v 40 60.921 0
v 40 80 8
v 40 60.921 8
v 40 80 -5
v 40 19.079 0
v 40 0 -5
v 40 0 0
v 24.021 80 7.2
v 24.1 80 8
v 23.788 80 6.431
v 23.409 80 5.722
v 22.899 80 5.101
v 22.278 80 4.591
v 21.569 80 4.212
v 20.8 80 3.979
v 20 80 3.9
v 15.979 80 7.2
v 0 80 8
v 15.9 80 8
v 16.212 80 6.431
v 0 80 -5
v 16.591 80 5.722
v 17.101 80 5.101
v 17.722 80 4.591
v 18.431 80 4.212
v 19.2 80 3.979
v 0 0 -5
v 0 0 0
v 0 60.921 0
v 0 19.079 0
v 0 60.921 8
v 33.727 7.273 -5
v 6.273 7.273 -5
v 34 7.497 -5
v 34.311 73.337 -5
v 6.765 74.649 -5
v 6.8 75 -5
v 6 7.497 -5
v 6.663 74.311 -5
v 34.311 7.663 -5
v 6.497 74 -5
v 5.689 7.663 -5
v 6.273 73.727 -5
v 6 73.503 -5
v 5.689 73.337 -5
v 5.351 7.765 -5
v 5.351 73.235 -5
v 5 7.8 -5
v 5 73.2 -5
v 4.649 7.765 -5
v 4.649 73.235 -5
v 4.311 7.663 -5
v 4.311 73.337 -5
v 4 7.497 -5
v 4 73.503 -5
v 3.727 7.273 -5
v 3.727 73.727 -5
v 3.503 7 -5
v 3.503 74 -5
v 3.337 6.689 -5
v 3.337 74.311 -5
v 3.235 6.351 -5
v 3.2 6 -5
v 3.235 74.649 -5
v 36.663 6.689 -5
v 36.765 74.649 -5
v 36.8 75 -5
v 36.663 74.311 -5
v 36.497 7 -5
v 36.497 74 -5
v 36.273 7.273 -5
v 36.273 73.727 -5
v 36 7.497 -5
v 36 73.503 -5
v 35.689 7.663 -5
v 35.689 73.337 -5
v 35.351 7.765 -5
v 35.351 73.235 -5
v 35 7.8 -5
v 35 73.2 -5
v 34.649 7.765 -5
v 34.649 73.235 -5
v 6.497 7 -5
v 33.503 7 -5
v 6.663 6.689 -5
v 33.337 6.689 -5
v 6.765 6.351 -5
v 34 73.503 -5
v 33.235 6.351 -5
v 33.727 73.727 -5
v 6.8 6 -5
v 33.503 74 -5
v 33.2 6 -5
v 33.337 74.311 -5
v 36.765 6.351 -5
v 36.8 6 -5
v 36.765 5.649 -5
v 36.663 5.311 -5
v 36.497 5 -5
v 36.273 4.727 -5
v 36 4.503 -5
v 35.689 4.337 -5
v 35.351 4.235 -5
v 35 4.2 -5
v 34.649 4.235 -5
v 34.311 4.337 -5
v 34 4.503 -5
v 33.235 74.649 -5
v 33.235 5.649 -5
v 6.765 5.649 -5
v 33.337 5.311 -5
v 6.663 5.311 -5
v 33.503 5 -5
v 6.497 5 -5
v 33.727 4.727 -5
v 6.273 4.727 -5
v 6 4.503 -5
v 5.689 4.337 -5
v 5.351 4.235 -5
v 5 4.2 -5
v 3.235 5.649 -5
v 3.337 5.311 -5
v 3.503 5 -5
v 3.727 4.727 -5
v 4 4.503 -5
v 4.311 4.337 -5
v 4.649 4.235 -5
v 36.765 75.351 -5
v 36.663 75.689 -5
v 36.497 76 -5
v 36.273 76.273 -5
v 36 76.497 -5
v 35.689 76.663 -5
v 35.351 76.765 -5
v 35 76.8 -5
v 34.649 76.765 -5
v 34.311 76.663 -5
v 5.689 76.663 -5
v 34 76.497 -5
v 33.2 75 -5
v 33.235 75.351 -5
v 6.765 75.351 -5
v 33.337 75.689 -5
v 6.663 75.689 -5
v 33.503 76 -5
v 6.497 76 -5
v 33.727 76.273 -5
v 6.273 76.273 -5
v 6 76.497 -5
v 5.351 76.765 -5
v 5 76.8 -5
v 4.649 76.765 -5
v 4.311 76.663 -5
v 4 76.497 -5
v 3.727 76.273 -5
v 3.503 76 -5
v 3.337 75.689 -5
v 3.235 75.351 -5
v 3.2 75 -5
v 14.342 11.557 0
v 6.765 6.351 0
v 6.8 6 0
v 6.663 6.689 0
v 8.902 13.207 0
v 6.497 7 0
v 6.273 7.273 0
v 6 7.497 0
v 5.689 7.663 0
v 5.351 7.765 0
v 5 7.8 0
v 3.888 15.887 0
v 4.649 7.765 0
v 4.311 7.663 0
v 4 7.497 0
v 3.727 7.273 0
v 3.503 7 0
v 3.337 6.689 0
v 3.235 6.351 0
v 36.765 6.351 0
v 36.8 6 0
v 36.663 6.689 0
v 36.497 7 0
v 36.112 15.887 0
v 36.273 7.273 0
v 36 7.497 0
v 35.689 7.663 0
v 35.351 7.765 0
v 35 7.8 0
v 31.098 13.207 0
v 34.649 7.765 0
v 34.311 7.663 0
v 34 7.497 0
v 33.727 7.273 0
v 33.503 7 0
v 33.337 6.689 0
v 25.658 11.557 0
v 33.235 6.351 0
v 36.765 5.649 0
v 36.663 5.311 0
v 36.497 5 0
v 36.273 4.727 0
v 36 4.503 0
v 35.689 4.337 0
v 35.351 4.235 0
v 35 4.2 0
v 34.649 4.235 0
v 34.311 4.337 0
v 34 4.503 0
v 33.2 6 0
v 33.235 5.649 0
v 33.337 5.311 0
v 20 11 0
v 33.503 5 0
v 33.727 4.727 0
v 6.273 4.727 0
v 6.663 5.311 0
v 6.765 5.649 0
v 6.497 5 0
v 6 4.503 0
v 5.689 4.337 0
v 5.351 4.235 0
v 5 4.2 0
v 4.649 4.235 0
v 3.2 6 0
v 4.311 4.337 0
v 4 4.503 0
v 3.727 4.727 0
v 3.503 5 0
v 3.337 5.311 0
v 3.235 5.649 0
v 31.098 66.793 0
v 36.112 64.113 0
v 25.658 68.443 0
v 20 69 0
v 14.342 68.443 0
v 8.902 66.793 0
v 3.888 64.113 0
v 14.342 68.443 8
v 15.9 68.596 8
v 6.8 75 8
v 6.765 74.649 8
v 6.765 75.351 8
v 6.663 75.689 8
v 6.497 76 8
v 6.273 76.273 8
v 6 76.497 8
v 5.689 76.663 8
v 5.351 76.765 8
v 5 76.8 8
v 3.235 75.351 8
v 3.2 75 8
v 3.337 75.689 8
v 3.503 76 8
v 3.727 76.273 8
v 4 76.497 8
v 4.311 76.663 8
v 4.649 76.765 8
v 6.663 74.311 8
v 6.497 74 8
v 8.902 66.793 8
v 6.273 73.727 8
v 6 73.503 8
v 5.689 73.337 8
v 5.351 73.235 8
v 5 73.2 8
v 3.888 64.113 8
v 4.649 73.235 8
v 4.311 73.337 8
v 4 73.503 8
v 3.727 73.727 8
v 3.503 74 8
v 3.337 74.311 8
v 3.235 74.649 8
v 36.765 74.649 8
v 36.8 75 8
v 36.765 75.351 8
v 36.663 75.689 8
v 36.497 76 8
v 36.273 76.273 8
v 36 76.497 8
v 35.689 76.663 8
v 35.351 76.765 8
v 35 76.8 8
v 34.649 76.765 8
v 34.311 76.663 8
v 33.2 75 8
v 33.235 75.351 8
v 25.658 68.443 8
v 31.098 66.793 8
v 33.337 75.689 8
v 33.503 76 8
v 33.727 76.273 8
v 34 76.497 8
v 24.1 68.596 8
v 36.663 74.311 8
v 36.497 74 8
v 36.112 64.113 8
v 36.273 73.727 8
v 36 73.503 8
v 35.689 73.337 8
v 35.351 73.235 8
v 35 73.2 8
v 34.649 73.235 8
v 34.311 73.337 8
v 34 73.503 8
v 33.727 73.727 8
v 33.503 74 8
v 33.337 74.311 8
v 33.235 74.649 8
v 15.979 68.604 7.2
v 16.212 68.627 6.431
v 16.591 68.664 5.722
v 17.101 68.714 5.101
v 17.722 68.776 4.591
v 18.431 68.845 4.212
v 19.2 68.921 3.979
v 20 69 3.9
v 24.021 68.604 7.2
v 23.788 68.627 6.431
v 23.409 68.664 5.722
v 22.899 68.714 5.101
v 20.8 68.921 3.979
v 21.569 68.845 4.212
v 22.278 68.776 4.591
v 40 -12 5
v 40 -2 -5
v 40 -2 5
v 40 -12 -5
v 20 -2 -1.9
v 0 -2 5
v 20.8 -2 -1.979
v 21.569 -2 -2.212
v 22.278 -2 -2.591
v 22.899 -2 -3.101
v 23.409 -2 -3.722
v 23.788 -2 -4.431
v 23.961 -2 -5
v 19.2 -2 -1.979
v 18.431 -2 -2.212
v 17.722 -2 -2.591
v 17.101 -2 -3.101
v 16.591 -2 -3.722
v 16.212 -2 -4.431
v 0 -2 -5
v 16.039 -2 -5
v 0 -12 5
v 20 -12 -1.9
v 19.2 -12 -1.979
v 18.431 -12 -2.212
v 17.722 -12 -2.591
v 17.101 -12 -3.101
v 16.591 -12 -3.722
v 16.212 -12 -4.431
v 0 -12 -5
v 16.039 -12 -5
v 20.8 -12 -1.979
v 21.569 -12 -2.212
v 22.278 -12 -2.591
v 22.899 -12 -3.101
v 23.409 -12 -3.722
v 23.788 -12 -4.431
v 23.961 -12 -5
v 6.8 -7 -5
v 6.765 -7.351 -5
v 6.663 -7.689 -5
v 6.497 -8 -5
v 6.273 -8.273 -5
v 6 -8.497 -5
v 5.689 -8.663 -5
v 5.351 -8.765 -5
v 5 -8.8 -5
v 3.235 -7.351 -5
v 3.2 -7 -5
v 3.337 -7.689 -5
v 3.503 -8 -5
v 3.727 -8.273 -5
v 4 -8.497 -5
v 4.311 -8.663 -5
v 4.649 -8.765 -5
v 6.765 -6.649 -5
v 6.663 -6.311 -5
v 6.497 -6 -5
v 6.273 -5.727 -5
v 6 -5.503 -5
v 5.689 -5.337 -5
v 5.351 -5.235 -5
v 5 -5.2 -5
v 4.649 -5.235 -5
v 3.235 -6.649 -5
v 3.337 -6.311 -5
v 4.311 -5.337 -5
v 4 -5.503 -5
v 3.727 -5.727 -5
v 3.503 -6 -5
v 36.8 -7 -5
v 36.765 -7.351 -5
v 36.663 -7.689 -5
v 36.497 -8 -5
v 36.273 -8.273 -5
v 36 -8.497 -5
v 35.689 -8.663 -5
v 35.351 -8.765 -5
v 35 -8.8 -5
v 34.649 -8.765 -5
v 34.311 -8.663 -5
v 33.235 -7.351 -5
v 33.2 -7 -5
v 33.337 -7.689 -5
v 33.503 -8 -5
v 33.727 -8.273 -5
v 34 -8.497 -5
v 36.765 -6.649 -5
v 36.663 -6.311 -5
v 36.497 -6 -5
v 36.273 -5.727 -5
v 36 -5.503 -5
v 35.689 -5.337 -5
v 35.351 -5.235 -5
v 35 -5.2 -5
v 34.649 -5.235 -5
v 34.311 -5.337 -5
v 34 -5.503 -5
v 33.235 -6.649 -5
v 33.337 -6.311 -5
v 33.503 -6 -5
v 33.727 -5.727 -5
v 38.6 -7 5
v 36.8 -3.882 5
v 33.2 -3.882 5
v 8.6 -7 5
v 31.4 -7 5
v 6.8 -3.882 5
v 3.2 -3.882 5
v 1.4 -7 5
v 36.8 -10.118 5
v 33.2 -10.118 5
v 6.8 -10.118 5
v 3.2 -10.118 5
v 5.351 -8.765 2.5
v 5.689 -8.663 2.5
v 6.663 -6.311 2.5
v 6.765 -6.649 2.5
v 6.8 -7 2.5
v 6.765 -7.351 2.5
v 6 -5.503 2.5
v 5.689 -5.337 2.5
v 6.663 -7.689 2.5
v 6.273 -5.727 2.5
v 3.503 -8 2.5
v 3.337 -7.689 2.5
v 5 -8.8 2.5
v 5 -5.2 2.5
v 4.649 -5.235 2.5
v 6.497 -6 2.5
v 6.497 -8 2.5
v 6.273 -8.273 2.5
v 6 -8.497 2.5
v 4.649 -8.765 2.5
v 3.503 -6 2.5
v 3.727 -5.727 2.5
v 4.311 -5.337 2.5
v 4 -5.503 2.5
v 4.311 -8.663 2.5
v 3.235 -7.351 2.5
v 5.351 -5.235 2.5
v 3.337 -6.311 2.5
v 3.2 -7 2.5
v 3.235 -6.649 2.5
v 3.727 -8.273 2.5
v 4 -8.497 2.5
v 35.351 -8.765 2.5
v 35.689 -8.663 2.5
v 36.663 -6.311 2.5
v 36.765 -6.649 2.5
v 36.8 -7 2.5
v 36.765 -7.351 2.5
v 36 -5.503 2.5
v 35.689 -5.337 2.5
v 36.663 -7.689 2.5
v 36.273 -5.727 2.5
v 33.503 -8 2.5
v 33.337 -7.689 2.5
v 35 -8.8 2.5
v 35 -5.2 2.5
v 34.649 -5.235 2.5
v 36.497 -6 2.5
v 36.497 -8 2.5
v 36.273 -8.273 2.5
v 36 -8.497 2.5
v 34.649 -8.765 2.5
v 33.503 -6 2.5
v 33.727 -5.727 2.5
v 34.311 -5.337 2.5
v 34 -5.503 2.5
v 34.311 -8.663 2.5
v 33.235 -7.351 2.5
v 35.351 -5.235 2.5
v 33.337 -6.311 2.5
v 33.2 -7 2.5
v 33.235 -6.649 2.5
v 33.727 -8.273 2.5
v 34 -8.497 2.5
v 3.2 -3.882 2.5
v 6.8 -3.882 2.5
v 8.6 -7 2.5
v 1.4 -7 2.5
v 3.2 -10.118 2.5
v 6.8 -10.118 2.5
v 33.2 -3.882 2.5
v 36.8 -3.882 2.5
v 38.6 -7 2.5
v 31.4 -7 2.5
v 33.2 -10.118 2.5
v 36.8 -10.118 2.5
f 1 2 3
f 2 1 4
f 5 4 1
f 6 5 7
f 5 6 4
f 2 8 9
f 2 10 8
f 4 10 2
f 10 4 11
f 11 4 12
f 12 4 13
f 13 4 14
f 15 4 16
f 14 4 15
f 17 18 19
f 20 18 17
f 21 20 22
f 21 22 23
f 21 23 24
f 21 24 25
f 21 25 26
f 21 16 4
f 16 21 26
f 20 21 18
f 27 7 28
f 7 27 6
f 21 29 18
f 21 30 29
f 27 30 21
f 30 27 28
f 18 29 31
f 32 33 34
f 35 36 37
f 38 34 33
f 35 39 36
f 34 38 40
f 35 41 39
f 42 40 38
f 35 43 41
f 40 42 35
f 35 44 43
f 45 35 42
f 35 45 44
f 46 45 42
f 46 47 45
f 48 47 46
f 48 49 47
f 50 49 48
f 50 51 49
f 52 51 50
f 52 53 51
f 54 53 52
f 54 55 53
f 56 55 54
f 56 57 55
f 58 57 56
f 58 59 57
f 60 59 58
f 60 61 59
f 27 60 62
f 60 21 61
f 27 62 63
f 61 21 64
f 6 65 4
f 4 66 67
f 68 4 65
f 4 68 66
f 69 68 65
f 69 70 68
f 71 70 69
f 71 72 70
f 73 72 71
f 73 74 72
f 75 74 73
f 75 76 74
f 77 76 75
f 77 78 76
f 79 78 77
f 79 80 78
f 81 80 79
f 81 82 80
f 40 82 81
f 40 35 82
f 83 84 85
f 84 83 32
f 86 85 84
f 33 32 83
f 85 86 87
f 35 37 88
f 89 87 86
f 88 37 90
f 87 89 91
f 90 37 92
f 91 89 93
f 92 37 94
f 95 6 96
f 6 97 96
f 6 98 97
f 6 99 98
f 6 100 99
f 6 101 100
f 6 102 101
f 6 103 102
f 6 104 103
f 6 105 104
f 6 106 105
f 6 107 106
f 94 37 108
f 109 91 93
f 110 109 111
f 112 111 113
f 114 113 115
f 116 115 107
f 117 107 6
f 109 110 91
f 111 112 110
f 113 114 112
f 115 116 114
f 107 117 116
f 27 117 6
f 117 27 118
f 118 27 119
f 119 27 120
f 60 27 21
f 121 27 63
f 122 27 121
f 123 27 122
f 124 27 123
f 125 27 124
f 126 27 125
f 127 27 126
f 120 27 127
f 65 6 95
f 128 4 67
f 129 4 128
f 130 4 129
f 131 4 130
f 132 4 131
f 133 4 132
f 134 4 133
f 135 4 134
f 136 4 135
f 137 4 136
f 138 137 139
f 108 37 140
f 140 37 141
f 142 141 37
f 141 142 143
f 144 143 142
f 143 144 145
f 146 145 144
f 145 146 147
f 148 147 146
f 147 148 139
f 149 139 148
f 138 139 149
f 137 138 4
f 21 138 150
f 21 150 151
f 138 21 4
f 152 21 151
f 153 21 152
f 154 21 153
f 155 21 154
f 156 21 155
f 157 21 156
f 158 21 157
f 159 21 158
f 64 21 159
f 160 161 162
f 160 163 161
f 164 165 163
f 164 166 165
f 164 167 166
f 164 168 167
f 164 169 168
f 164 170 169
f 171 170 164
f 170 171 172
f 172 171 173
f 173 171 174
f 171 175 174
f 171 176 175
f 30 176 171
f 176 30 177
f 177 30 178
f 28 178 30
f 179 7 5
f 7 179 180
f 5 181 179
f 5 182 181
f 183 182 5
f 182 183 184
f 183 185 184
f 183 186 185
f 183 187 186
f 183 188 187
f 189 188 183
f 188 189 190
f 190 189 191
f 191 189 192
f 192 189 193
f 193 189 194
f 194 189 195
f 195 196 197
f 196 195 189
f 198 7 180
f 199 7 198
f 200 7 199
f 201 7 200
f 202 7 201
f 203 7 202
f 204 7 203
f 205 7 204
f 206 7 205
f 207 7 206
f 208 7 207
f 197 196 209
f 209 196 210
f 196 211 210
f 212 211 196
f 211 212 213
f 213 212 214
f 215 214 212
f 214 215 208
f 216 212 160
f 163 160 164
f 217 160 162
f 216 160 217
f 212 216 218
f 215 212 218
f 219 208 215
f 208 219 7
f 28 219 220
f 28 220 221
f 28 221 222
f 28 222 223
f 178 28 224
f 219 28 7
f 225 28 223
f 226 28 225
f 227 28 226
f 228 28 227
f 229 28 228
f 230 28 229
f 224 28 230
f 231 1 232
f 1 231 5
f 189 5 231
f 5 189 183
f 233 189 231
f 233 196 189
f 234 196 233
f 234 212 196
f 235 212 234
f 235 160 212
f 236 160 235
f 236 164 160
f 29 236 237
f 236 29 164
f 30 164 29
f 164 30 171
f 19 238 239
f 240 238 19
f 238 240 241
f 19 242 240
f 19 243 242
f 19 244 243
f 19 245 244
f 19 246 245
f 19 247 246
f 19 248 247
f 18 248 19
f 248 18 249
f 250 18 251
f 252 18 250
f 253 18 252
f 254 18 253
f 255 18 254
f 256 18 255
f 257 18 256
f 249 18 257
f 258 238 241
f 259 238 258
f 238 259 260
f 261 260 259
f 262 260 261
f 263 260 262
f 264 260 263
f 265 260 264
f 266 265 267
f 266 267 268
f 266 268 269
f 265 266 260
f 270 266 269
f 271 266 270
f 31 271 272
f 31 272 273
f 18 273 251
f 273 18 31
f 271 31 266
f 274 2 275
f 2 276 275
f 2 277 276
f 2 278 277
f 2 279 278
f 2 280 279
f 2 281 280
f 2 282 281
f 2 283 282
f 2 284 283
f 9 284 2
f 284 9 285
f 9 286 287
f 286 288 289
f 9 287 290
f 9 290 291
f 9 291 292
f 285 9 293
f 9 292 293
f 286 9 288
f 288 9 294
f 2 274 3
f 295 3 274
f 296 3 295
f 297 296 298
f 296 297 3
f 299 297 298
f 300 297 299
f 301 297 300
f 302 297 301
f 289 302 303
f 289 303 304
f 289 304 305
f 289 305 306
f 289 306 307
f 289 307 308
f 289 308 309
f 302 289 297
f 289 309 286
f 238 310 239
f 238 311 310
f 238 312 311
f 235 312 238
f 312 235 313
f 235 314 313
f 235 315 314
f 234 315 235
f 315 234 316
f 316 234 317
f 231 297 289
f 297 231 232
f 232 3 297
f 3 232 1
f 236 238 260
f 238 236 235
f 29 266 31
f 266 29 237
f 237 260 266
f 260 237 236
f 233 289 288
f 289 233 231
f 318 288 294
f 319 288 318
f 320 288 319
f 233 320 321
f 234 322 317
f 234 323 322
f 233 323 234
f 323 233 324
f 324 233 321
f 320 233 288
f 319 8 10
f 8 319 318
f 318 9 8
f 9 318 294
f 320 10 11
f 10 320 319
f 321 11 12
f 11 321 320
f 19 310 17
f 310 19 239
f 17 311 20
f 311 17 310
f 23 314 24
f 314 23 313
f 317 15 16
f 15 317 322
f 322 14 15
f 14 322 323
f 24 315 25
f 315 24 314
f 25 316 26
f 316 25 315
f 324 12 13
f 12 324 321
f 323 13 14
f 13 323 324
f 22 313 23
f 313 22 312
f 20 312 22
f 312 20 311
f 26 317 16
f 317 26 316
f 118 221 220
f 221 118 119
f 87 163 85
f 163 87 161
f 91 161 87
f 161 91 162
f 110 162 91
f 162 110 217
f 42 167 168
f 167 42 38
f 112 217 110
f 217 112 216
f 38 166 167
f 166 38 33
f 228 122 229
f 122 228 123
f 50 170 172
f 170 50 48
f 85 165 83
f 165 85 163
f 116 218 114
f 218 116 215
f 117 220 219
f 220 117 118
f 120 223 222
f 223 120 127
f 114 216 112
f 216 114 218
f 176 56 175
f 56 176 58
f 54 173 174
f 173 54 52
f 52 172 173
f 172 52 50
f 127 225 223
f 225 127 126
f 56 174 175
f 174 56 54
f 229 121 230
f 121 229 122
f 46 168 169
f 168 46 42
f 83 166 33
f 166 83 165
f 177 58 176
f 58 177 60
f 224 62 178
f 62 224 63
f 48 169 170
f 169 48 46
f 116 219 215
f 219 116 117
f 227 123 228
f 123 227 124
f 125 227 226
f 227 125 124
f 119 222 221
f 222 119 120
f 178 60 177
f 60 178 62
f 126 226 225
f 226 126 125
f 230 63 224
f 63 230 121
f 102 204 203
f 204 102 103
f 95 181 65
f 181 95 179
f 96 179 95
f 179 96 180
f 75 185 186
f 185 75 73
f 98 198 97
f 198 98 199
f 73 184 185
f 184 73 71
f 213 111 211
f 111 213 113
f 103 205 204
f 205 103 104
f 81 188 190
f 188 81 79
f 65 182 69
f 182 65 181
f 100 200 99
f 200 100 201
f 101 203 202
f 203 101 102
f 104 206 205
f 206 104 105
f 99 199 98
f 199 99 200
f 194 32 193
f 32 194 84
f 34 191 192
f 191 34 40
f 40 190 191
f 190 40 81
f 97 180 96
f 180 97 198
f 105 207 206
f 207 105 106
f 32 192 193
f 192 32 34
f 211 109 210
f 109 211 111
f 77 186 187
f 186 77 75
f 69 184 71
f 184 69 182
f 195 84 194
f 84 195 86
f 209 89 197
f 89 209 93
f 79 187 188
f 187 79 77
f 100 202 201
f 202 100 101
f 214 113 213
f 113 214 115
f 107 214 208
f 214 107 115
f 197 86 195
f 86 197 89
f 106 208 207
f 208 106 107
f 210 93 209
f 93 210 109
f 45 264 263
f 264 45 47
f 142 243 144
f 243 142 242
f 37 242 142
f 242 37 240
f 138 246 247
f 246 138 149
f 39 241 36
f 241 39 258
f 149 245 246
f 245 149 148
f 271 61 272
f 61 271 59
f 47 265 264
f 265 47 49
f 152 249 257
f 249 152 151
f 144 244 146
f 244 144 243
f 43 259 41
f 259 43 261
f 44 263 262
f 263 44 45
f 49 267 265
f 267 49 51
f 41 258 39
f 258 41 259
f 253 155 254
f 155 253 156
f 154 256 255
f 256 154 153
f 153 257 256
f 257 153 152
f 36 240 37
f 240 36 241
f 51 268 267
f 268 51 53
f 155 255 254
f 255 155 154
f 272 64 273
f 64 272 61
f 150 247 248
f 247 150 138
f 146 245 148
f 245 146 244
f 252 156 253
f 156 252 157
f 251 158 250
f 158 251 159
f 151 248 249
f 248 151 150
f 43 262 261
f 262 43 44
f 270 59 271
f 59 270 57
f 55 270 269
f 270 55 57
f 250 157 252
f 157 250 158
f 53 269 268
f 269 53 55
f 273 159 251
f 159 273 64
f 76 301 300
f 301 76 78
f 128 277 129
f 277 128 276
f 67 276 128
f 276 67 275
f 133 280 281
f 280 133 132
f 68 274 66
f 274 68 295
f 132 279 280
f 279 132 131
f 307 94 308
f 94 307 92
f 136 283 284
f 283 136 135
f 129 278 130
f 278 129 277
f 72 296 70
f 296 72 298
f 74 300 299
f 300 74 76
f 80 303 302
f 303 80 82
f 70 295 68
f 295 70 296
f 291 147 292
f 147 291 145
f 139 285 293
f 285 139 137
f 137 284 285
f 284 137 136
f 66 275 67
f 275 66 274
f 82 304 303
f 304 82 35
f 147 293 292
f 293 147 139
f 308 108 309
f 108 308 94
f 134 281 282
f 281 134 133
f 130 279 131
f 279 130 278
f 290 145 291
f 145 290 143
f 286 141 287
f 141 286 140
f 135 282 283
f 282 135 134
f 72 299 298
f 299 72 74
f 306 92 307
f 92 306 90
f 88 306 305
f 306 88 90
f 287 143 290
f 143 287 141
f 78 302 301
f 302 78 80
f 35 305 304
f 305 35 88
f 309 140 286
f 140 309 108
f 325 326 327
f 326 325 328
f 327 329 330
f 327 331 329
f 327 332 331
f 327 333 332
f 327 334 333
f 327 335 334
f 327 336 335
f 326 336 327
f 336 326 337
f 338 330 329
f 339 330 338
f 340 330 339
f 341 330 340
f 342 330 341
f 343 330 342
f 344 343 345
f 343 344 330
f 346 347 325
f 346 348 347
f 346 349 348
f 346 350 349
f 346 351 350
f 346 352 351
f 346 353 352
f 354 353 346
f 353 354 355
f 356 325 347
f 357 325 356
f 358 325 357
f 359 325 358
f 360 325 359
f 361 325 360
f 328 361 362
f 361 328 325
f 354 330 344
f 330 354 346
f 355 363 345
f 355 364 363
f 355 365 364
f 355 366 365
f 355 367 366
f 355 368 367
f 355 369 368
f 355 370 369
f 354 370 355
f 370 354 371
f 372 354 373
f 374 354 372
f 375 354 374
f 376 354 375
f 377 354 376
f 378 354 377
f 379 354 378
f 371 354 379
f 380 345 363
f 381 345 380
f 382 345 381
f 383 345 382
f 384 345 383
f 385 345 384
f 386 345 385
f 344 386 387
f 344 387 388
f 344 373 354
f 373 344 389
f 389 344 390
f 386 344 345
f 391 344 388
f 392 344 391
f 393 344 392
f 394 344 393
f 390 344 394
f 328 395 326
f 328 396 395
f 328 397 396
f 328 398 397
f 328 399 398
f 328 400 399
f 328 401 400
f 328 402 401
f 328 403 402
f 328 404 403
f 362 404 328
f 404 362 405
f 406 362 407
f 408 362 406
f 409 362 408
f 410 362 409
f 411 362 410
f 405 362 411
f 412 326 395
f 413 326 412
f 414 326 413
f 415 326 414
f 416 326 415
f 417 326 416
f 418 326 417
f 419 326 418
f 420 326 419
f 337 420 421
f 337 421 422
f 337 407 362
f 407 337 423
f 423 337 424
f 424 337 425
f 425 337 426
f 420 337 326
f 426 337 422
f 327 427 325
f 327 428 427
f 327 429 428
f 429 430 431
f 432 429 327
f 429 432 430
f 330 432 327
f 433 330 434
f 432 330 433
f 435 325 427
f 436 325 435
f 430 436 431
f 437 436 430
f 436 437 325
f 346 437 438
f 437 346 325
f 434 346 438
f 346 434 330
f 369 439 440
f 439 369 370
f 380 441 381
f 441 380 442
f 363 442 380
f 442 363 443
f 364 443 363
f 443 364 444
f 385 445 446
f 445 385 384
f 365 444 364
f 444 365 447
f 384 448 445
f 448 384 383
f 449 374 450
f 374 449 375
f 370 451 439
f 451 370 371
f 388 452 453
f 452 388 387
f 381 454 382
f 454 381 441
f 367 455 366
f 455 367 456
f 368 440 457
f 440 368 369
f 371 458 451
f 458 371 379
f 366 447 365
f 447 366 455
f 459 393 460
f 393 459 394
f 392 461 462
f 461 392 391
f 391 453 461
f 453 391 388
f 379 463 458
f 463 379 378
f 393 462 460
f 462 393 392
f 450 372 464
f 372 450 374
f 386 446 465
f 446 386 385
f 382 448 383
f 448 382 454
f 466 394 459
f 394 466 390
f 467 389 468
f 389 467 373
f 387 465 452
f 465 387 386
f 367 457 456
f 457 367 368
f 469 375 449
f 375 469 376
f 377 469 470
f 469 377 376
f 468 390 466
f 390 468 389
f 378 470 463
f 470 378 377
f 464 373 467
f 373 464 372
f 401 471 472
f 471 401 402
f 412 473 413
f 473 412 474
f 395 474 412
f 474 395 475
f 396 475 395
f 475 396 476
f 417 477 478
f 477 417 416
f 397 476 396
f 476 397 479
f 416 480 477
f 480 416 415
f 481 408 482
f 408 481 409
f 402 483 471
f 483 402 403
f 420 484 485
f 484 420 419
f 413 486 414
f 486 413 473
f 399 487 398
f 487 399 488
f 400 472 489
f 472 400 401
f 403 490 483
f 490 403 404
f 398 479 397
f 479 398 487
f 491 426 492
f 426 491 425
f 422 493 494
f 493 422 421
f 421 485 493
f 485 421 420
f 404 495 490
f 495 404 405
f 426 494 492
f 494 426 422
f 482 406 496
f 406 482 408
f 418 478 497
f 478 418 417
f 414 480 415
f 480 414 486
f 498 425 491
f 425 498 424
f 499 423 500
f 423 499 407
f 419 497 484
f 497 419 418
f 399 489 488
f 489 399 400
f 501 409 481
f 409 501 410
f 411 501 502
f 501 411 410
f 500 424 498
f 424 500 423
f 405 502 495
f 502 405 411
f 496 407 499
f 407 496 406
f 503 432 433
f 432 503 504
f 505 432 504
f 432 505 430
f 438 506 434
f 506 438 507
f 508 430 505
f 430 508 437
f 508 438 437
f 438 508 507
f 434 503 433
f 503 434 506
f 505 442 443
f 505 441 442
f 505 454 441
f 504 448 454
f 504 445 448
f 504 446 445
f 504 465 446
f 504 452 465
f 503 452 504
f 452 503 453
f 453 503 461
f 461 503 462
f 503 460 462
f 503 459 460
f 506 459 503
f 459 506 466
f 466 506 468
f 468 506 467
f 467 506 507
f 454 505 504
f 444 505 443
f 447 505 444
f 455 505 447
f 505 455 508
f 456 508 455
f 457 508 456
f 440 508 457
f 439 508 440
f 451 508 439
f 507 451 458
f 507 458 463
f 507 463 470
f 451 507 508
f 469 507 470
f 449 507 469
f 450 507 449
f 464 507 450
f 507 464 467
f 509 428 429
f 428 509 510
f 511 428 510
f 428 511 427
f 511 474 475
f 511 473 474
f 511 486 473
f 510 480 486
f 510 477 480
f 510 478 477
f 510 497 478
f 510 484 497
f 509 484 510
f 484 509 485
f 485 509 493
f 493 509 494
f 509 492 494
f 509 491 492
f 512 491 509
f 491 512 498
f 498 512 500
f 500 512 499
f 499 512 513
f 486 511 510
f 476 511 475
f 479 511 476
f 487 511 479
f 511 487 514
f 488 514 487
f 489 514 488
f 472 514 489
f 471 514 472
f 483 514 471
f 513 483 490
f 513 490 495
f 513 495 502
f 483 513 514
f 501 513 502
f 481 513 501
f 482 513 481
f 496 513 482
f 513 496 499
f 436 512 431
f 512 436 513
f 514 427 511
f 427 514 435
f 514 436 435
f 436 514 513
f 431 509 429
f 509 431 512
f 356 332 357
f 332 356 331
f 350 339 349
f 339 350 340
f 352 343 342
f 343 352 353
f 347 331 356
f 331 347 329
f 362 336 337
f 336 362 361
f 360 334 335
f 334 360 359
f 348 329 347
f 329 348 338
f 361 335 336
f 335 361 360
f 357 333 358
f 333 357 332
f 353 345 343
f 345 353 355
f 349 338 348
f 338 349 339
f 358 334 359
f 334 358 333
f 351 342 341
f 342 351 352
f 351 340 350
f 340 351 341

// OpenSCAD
$fn=32;

space_between_holes = 30;
space_from_holes_to_bed = 70;
dial_mount_dia = 8;
dial_base_to_tip = 42;
dial_base_dia=58;


x = space_between_holes+10;
y = 5;
z= 80;


module dial_gauge_mount(){

    difference(){
        union(){
            cube([x,y,z]);
            translate([0,-8,40])cube([x,y+4,40]);
        
        }  


        translate([x/2,0,40]) rotate([90,0,0])cylinder(r=dial_base_dia/2,h=25);  
        translate([x/2,-10,60]) rotate([0,0,0])cylinder(r=4.1,h=25);  
        translate([x/2,-8,60]) rotate([0,0,0])cylinder(r=4.1,h=25);  
        
        translate([5,y+0.1,6]) rotate([90,0,0]) cylinder(r=1.8, h=y+0.2);
        translate([5+space_between_holes,y+0.1,6]) rotate([90,0,0]) cylinder(r=1.8, h=y+0.2);

     
        translate([5,10,75]) rotate([90,0,0]) cylinder(r=1.8, h=30);
       
        translate([5+space_between_holes,10,75]) rotate([90,0,0]) cylinder(r=1.8, h=30);
            
    }

}

module dial_gauge_clamp(){
    difference(){
        cube([x,10,10]);
        translate([5,11,5]) rotate([90,0,0]) cylinder(r=1.8, h=30);
        translate([5+space_between_holes,11,5]) rotate([90,0,0]) cylinder(r=1.8, h=30);
        // nut traps
        translate([5,2.5,5]) rotate([90,0,0]) cylinder(r=3.6, h=3,$fn=6);
        translate([5+space_between_holes,2.5,5]) rotate([90,0,0]) cylinder(r=3.6, h=3,$fn=6);
 

        translate([x/2,11,-1]) rotate([0,0,0])cylinder(r=4.1,h=25);  
                
    }

}

rotate([-90,0,0]){
   dial_gauge_mount();
   translate([0,-5,-12]) rotate([0,0,0]) dial_gauge_clamp();
}

//   translate([0,-18,70]) dial_gauge_clamp();
//   color("silver") translate([x/2,y-5,37]) rotate([90,180,0]) dial_gauge();

module dial_gauge(){
    union(){
        cylinder(r=dial_base_dia/2,h=25);
        translate([0,-dial_base_to_tip+14,7]) rotate(a=[90,0,0]) cylinder(r=dial_mount_dia/2,h=dial_base_to_tip);
    }

}
